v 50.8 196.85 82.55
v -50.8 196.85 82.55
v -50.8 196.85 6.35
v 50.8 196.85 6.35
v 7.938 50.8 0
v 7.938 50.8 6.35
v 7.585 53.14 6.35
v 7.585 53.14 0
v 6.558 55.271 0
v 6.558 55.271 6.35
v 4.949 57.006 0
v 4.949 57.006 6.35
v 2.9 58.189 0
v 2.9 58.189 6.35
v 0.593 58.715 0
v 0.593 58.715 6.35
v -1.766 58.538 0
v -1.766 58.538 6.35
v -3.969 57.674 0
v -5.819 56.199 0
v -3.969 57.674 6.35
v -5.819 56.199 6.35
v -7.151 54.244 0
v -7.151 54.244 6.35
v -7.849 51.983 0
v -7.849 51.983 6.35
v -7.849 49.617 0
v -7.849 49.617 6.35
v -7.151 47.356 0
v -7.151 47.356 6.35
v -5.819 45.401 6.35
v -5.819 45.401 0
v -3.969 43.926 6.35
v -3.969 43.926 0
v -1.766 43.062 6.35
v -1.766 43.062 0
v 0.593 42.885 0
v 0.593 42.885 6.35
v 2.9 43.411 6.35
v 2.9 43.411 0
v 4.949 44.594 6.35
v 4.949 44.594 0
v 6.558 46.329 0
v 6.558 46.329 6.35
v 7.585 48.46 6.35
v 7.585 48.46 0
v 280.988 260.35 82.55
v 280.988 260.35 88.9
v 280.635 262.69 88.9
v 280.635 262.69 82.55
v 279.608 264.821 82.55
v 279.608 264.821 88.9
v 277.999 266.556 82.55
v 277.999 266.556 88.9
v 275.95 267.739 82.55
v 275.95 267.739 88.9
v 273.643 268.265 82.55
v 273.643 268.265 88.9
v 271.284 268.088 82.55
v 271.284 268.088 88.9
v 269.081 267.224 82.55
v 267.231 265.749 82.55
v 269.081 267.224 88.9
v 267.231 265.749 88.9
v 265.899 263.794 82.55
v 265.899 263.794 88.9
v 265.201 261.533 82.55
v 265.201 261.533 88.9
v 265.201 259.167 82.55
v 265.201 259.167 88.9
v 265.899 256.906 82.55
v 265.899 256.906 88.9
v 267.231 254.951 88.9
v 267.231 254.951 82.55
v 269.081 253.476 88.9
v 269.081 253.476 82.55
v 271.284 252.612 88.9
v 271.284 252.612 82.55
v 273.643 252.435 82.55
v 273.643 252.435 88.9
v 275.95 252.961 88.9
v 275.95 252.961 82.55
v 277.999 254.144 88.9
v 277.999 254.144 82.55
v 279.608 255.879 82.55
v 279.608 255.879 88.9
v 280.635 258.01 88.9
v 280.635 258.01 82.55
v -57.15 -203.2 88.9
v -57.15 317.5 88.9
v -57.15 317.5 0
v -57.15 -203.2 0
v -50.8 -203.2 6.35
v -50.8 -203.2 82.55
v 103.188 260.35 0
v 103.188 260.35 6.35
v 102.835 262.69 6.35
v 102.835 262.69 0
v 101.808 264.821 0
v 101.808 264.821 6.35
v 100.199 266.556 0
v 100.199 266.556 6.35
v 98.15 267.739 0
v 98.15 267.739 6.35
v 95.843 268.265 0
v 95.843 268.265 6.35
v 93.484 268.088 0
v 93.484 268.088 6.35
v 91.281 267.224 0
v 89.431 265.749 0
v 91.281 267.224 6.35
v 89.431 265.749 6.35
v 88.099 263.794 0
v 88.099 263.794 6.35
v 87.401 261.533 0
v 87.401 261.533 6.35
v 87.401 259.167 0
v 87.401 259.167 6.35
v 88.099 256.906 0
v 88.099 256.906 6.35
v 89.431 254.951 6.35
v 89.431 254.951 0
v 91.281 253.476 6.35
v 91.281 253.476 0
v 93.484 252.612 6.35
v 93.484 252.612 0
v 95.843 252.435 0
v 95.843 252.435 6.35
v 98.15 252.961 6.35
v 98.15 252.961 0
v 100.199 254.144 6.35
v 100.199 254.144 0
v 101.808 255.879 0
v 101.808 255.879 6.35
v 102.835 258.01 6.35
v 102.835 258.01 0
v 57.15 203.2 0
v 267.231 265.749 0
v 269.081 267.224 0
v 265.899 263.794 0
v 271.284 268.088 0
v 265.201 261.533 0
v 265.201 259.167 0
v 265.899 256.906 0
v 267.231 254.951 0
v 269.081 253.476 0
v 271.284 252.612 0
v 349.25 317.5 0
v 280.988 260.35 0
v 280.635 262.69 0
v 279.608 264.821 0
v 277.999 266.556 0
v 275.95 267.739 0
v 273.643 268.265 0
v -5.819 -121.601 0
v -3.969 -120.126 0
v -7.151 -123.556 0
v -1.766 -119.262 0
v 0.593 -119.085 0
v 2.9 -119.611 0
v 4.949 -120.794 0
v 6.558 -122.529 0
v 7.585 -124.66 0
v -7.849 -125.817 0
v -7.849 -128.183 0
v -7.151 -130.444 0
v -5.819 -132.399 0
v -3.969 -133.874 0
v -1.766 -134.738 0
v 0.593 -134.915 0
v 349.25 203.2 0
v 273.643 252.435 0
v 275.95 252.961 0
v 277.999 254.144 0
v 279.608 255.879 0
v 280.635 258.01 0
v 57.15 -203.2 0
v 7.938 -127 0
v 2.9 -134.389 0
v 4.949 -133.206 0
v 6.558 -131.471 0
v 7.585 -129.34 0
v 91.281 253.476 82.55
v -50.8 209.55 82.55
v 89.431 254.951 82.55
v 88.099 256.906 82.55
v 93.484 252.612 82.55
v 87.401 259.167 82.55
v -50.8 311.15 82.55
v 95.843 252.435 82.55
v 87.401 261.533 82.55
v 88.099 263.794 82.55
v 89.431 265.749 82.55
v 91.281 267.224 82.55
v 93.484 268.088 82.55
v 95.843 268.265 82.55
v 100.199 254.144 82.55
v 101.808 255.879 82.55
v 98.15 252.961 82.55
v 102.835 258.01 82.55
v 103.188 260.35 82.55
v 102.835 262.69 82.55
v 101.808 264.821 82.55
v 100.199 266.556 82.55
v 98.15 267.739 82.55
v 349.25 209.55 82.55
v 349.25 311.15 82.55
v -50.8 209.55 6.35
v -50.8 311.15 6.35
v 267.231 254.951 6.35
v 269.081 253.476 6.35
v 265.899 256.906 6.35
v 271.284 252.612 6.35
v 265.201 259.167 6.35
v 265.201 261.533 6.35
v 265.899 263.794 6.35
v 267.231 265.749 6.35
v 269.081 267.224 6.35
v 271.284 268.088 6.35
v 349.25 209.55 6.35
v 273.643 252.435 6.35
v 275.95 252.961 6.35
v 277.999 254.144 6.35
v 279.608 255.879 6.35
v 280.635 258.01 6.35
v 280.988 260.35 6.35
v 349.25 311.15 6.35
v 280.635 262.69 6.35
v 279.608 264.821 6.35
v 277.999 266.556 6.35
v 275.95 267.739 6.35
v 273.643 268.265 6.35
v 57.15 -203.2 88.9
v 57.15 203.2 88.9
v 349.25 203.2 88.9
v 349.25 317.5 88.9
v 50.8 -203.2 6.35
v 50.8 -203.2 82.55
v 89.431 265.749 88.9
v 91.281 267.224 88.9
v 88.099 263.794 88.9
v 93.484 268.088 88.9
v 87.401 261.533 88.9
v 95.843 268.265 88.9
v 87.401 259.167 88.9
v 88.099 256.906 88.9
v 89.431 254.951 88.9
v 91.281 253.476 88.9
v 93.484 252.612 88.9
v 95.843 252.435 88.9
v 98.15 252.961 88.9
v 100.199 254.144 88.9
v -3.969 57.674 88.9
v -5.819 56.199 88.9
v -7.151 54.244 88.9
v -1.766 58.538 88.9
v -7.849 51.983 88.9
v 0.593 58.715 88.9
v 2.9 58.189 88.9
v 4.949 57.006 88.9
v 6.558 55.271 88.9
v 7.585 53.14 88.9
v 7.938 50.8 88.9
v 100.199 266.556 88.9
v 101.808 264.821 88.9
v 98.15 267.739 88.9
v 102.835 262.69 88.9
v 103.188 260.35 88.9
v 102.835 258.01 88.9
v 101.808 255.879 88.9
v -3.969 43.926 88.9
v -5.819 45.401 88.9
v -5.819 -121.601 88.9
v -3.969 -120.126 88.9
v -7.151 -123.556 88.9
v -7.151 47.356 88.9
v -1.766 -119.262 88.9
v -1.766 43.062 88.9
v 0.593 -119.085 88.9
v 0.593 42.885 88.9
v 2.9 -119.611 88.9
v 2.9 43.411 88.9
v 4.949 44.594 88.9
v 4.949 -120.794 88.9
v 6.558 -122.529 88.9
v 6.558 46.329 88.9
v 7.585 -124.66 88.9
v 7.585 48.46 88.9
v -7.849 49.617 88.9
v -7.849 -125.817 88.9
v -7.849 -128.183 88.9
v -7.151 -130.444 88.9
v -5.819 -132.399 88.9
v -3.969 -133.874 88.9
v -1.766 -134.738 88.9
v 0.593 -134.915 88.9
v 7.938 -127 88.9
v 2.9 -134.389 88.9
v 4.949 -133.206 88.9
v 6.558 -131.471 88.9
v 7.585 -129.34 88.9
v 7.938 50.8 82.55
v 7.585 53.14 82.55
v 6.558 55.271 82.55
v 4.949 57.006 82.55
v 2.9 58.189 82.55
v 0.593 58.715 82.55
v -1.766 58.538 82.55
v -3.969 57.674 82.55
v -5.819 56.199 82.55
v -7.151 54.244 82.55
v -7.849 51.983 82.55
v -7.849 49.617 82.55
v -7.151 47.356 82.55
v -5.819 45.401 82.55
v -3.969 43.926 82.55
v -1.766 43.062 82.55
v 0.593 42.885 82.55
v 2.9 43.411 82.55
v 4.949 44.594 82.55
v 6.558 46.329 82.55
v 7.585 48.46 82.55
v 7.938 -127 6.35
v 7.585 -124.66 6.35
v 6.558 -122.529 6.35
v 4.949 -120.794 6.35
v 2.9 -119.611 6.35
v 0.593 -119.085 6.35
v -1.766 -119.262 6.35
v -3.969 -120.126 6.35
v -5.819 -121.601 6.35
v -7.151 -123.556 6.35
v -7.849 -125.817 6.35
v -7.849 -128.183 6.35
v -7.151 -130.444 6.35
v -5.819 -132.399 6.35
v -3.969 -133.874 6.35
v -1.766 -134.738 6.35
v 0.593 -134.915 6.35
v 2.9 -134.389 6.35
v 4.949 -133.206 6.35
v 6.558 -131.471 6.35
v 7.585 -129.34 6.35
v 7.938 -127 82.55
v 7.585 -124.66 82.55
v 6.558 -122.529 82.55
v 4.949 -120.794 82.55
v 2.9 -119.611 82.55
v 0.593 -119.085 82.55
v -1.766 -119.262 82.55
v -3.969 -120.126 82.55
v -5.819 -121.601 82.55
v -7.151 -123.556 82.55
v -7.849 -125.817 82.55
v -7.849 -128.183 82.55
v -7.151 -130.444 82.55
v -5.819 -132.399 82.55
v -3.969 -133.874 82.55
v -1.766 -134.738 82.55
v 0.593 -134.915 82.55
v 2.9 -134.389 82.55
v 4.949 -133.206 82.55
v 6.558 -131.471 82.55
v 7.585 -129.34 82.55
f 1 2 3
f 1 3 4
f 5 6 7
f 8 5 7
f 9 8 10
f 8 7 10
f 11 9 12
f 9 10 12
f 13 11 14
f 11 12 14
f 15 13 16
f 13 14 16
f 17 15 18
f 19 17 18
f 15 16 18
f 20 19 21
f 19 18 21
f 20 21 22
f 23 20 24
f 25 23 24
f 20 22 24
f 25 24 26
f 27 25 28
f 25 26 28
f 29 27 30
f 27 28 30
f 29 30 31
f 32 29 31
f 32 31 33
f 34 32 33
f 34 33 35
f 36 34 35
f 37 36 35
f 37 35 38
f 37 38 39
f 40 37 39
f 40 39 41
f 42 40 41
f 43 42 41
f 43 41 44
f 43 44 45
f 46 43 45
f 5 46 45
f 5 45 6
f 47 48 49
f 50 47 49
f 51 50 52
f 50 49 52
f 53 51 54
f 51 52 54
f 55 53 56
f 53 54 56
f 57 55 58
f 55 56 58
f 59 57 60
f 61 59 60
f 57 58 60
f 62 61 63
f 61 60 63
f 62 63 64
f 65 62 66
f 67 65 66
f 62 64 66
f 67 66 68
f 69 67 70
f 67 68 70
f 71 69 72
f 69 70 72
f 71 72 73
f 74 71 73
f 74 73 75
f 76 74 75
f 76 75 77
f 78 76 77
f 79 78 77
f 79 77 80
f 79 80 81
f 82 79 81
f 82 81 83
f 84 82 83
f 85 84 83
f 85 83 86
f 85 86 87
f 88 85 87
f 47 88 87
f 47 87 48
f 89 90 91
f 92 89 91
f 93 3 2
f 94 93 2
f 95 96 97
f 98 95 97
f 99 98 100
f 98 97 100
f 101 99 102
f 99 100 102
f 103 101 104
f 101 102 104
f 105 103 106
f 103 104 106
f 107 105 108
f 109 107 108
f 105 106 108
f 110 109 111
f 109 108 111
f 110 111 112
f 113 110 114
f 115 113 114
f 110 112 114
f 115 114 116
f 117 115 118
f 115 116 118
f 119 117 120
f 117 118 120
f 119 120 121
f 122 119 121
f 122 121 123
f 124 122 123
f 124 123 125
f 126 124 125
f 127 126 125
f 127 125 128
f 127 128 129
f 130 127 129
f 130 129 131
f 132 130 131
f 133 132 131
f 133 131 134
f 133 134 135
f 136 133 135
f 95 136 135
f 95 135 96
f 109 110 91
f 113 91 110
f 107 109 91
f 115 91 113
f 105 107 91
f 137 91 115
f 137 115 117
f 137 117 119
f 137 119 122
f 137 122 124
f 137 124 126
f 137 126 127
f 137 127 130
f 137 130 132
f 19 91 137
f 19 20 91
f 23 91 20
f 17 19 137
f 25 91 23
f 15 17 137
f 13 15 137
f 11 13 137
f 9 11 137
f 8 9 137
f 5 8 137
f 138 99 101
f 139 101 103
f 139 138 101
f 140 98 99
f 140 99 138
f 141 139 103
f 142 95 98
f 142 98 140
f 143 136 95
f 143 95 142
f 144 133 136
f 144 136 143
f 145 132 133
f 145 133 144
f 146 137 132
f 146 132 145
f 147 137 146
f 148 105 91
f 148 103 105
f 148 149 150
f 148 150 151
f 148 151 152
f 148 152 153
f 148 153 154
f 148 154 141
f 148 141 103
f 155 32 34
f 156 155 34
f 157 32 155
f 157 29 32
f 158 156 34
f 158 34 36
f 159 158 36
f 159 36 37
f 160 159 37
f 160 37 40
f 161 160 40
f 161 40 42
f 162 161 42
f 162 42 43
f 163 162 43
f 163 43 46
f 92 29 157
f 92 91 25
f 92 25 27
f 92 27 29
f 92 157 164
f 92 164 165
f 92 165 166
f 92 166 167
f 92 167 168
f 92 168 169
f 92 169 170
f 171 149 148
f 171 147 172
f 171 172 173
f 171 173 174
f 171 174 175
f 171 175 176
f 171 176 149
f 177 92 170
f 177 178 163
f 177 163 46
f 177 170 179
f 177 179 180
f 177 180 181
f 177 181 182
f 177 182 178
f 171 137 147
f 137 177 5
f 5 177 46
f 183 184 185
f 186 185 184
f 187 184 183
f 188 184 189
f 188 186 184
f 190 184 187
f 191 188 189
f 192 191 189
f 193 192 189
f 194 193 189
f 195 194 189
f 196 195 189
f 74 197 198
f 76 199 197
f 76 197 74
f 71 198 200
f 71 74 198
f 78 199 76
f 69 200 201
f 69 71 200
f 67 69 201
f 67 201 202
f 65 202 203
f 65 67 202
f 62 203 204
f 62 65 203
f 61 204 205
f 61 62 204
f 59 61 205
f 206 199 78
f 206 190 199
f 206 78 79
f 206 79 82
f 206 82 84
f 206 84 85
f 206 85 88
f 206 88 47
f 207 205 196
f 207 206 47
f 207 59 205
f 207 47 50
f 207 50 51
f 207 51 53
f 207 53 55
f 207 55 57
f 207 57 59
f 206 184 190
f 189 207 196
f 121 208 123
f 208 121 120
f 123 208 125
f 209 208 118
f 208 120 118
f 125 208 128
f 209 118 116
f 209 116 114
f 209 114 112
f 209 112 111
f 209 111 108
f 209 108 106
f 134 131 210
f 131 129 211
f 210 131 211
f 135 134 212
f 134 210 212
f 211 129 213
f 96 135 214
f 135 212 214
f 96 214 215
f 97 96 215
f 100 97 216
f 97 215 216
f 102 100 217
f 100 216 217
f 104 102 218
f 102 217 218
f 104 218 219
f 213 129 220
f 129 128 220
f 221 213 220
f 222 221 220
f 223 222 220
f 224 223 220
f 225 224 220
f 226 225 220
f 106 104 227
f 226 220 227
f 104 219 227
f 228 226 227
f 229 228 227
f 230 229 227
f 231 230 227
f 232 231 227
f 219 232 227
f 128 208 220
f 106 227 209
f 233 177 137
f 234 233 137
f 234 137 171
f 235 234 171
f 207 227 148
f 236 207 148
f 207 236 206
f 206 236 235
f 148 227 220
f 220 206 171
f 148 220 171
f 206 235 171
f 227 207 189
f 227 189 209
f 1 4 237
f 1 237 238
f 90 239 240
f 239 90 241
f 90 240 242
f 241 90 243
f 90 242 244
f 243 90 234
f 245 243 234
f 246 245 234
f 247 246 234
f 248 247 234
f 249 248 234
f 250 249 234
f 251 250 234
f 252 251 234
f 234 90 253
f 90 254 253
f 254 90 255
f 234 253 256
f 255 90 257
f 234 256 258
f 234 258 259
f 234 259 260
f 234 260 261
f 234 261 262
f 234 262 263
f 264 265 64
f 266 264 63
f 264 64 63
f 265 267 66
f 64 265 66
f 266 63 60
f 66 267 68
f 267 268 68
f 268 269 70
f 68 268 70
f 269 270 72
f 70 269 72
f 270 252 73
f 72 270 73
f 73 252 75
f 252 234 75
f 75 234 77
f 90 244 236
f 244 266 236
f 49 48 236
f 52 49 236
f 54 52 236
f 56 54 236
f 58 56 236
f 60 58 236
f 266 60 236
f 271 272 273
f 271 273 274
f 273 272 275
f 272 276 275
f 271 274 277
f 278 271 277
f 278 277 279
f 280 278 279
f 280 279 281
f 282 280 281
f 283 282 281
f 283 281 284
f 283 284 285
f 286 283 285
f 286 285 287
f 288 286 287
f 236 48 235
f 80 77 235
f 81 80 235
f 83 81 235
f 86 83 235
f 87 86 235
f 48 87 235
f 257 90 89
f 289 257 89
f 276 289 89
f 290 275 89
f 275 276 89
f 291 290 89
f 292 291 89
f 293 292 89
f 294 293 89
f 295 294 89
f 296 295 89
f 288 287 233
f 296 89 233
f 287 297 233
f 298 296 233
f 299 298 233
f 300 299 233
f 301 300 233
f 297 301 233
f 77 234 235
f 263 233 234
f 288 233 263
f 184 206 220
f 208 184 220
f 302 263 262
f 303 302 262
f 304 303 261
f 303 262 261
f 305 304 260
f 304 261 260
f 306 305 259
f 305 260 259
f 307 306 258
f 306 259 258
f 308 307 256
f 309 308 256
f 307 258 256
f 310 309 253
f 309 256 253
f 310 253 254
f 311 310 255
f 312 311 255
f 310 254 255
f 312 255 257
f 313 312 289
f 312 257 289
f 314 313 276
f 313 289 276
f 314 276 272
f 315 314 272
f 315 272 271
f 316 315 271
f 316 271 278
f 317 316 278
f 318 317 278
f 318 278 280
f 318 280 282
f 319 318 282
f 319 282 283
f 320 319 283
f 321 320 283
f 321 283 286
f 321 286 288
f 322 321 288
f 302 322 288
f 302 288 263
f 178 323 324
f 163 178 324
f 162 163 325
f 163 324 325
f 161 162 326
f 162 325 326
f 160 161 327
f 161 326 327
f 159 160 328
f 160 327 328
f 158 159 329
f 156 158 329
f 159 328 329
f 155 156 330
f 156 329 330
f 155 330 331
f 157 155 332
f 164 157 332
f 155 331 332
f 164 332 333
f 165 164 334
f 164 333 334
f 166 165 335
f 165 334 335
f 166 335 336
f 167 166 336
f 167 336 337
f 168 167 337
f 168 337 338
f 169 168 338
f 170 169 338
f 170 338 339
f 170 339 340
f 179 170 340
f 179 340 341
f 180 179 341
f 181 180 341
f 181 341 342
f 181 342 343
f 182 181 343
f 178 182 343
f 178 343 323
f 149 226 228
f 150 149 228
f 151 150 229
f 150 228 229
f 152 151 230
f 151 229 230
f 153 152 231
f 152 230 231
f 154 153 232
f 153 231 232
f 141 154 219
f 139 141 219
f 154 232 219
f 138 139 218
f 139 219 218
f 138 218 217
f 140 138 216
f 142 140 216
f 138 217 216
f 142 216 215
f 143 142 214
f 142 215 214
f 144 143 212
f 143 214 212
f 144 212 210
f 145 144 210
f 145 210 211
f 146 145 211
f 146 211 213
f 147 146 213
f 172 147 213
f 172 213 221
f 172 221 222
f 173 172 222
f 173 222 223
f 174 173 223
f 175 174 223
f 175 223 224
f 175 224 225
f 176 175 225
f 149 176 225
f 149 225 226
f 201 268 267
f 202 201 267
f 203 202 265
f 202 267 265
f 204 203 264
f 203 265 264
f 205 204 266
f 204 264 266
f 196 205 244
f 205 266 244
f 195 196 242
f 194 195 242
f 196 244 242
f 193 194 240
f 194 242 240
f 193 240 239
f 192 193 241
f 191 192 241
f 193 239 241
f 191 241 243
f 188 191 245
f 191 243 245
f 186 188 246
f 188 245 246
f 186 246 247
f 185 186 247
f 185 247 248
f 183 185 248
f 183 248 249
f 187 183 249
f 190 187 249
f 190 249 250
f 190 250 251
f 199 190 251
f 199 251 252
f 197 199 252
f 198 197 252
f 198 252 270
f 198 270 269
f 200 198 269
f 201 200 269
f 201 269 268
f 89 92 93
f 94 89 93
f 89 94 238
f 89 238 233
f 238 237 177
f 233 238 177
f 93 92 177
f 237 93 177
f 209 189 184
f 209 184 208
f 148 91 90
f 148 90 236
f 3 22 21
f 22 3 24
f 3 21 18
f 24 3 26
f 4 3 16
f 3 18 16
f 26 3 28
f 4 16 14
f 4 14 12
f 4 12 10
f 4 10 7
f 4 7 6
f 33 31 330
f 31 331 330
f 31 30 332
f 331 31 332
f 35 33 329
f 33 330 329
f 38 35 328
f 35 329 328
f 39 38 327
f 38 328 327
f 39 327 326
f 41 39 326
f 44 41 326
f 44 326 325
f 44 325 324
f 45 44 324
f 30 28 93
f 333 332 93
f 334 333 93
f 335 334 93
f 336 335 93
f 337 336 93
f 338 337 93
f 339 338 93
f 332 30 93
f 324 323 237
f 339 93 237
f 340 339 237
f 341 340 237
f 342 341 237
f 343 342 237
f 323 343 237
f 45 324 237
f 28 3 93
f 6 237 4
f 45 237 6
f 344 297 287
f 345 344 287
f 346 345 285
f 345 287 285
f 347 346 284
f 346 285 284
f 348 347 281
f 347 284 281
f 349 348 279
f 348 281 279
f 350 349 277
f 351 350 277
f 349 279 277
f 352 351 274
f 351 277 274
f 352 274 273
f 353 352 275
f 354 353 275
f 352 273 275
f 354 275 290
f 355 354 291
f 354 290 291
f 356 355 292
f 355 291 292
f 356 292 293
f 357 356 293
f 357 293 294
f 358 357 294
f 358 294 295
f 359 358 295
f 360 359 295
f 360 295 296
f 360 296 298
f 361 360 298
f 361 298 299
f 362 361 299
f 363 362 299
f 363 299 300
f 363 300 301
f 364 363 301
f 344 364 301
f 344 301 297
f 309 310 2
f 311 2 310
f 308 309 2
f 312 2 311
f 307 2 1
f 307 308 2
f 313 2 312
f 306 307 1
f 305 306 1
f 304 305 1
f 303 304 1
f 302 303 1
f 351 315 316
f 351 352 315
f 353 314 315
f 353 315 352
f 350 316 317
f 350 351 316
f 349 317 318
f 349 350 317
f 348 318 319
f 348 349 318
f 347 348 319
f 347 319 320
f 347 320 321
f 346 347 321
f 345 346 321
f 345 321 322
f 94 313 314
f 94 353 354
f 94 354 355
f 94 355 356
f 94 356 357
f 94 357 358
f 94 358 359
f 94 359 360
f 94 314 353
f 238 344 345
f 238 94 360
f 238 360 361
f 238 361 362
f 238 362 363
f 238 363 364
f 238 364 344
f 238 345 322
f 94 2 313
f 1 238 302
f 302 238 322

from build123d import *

# Parameters (mm, degrees)
SKETCH1_W           = 114.3
SKETCH1_H           = 406.4
BOSS_EXTRUDE1_DEPTH = 88.9
SKETCH2_W           = 406.4
SKETCH2_H           = 88.9
BOSS_EXTRUDE2_DEPTH = 114.3
SKETCH3_W           = 76.2
SKETCH3_H           = 101.6
CUT_EXTRUDE1_DEPTH  = 400.05
SKETCH4_W           = 101.6
SKETCH4_H           = 76.2
CUT_EXTRUDE3_DEPTH  = 400.05
SKETCH5_R           = 7.9375
CUT_EXTRUDE4_DEPTH  = 400.05
SKETCH6_R           = 7.9375
CUT_EXTRUDE5_DEPTH  = 400.05


with BuildPart() as part:
    # Sketch1 → Boss-Extrude1 (new body)
    with BuildSketch(Plane.XY):
        Rectangle(SKETCH1_W, SKETCH1_H)
    extrude(amount=BOSS_EXTRUDE1_DEPTH)

    # Sketch2 → Boss-Extrude2 (add)
    with BuildSketch(Plane(origin=(0, 203.2, 0), x_dir=(1, 0, 0), z_dir=(0, 1, 0))):
        with Locations((146.05, -44.45)):
            Rectangle(SKETCH2_W, SKETCH2_H)
    extrude(amount=BOSS_EXTRUDE2_DEPTH)

    # Sketch3 → Cut-Extrude1 (cut)
    with BuildSketch(Plane(origin=(349.25, 0, 0), x_dir=(0, 0, -1), z_dir=(1, 0, 0))):
        with Locations((-44.45, 260.35)):
            Rectangle(SKETCH3_W, SKETCH3_H)
    extrude(amount=-CUT_EXTRUDE1_DEPTH, mode=Mode.SUBTRACT)

    # Sketch4 → Cut-Extrude3 (cut)
    with BuildSketch(Plane.XZ.offset(203.2)):
        with Locations((0, 44.45)):
            Rectangle(SKETCH4_W, SKETCH4_H)
    extrude(amount=-CUT_EXTRUDE3_DEPTH, mode=Mode.SUBTRACT)

    # Sketch5 → Cut-Extrude4 (cut)
    with BuildSketch(Plane.XY.offset(88.9)):
        with Locations((273.05, 260.35)):
            Circle(SKETCH5_R)
        with Locations((95.25, 260.35)):
            Circle(SKETCH5_R)
    extrude(amount=-CUT_EXTRUDE4_DEPTH, mode=Mode.SUBTRACT)

    # Sketch6 → Cut-Extrude5 (cut)
    with BuildSketch(Plane.XY.offset(88.9)):
        with Locations((0, -127)):
            Circle(SKETCH6_R)
        with Locations((0, 50.8)):
            Circle(SKETCH6_R)
    extrude(amount=-CUT_EXTRUDE5_DEPTH, mode=Mode.SUBTRACT)


solid = part.part
